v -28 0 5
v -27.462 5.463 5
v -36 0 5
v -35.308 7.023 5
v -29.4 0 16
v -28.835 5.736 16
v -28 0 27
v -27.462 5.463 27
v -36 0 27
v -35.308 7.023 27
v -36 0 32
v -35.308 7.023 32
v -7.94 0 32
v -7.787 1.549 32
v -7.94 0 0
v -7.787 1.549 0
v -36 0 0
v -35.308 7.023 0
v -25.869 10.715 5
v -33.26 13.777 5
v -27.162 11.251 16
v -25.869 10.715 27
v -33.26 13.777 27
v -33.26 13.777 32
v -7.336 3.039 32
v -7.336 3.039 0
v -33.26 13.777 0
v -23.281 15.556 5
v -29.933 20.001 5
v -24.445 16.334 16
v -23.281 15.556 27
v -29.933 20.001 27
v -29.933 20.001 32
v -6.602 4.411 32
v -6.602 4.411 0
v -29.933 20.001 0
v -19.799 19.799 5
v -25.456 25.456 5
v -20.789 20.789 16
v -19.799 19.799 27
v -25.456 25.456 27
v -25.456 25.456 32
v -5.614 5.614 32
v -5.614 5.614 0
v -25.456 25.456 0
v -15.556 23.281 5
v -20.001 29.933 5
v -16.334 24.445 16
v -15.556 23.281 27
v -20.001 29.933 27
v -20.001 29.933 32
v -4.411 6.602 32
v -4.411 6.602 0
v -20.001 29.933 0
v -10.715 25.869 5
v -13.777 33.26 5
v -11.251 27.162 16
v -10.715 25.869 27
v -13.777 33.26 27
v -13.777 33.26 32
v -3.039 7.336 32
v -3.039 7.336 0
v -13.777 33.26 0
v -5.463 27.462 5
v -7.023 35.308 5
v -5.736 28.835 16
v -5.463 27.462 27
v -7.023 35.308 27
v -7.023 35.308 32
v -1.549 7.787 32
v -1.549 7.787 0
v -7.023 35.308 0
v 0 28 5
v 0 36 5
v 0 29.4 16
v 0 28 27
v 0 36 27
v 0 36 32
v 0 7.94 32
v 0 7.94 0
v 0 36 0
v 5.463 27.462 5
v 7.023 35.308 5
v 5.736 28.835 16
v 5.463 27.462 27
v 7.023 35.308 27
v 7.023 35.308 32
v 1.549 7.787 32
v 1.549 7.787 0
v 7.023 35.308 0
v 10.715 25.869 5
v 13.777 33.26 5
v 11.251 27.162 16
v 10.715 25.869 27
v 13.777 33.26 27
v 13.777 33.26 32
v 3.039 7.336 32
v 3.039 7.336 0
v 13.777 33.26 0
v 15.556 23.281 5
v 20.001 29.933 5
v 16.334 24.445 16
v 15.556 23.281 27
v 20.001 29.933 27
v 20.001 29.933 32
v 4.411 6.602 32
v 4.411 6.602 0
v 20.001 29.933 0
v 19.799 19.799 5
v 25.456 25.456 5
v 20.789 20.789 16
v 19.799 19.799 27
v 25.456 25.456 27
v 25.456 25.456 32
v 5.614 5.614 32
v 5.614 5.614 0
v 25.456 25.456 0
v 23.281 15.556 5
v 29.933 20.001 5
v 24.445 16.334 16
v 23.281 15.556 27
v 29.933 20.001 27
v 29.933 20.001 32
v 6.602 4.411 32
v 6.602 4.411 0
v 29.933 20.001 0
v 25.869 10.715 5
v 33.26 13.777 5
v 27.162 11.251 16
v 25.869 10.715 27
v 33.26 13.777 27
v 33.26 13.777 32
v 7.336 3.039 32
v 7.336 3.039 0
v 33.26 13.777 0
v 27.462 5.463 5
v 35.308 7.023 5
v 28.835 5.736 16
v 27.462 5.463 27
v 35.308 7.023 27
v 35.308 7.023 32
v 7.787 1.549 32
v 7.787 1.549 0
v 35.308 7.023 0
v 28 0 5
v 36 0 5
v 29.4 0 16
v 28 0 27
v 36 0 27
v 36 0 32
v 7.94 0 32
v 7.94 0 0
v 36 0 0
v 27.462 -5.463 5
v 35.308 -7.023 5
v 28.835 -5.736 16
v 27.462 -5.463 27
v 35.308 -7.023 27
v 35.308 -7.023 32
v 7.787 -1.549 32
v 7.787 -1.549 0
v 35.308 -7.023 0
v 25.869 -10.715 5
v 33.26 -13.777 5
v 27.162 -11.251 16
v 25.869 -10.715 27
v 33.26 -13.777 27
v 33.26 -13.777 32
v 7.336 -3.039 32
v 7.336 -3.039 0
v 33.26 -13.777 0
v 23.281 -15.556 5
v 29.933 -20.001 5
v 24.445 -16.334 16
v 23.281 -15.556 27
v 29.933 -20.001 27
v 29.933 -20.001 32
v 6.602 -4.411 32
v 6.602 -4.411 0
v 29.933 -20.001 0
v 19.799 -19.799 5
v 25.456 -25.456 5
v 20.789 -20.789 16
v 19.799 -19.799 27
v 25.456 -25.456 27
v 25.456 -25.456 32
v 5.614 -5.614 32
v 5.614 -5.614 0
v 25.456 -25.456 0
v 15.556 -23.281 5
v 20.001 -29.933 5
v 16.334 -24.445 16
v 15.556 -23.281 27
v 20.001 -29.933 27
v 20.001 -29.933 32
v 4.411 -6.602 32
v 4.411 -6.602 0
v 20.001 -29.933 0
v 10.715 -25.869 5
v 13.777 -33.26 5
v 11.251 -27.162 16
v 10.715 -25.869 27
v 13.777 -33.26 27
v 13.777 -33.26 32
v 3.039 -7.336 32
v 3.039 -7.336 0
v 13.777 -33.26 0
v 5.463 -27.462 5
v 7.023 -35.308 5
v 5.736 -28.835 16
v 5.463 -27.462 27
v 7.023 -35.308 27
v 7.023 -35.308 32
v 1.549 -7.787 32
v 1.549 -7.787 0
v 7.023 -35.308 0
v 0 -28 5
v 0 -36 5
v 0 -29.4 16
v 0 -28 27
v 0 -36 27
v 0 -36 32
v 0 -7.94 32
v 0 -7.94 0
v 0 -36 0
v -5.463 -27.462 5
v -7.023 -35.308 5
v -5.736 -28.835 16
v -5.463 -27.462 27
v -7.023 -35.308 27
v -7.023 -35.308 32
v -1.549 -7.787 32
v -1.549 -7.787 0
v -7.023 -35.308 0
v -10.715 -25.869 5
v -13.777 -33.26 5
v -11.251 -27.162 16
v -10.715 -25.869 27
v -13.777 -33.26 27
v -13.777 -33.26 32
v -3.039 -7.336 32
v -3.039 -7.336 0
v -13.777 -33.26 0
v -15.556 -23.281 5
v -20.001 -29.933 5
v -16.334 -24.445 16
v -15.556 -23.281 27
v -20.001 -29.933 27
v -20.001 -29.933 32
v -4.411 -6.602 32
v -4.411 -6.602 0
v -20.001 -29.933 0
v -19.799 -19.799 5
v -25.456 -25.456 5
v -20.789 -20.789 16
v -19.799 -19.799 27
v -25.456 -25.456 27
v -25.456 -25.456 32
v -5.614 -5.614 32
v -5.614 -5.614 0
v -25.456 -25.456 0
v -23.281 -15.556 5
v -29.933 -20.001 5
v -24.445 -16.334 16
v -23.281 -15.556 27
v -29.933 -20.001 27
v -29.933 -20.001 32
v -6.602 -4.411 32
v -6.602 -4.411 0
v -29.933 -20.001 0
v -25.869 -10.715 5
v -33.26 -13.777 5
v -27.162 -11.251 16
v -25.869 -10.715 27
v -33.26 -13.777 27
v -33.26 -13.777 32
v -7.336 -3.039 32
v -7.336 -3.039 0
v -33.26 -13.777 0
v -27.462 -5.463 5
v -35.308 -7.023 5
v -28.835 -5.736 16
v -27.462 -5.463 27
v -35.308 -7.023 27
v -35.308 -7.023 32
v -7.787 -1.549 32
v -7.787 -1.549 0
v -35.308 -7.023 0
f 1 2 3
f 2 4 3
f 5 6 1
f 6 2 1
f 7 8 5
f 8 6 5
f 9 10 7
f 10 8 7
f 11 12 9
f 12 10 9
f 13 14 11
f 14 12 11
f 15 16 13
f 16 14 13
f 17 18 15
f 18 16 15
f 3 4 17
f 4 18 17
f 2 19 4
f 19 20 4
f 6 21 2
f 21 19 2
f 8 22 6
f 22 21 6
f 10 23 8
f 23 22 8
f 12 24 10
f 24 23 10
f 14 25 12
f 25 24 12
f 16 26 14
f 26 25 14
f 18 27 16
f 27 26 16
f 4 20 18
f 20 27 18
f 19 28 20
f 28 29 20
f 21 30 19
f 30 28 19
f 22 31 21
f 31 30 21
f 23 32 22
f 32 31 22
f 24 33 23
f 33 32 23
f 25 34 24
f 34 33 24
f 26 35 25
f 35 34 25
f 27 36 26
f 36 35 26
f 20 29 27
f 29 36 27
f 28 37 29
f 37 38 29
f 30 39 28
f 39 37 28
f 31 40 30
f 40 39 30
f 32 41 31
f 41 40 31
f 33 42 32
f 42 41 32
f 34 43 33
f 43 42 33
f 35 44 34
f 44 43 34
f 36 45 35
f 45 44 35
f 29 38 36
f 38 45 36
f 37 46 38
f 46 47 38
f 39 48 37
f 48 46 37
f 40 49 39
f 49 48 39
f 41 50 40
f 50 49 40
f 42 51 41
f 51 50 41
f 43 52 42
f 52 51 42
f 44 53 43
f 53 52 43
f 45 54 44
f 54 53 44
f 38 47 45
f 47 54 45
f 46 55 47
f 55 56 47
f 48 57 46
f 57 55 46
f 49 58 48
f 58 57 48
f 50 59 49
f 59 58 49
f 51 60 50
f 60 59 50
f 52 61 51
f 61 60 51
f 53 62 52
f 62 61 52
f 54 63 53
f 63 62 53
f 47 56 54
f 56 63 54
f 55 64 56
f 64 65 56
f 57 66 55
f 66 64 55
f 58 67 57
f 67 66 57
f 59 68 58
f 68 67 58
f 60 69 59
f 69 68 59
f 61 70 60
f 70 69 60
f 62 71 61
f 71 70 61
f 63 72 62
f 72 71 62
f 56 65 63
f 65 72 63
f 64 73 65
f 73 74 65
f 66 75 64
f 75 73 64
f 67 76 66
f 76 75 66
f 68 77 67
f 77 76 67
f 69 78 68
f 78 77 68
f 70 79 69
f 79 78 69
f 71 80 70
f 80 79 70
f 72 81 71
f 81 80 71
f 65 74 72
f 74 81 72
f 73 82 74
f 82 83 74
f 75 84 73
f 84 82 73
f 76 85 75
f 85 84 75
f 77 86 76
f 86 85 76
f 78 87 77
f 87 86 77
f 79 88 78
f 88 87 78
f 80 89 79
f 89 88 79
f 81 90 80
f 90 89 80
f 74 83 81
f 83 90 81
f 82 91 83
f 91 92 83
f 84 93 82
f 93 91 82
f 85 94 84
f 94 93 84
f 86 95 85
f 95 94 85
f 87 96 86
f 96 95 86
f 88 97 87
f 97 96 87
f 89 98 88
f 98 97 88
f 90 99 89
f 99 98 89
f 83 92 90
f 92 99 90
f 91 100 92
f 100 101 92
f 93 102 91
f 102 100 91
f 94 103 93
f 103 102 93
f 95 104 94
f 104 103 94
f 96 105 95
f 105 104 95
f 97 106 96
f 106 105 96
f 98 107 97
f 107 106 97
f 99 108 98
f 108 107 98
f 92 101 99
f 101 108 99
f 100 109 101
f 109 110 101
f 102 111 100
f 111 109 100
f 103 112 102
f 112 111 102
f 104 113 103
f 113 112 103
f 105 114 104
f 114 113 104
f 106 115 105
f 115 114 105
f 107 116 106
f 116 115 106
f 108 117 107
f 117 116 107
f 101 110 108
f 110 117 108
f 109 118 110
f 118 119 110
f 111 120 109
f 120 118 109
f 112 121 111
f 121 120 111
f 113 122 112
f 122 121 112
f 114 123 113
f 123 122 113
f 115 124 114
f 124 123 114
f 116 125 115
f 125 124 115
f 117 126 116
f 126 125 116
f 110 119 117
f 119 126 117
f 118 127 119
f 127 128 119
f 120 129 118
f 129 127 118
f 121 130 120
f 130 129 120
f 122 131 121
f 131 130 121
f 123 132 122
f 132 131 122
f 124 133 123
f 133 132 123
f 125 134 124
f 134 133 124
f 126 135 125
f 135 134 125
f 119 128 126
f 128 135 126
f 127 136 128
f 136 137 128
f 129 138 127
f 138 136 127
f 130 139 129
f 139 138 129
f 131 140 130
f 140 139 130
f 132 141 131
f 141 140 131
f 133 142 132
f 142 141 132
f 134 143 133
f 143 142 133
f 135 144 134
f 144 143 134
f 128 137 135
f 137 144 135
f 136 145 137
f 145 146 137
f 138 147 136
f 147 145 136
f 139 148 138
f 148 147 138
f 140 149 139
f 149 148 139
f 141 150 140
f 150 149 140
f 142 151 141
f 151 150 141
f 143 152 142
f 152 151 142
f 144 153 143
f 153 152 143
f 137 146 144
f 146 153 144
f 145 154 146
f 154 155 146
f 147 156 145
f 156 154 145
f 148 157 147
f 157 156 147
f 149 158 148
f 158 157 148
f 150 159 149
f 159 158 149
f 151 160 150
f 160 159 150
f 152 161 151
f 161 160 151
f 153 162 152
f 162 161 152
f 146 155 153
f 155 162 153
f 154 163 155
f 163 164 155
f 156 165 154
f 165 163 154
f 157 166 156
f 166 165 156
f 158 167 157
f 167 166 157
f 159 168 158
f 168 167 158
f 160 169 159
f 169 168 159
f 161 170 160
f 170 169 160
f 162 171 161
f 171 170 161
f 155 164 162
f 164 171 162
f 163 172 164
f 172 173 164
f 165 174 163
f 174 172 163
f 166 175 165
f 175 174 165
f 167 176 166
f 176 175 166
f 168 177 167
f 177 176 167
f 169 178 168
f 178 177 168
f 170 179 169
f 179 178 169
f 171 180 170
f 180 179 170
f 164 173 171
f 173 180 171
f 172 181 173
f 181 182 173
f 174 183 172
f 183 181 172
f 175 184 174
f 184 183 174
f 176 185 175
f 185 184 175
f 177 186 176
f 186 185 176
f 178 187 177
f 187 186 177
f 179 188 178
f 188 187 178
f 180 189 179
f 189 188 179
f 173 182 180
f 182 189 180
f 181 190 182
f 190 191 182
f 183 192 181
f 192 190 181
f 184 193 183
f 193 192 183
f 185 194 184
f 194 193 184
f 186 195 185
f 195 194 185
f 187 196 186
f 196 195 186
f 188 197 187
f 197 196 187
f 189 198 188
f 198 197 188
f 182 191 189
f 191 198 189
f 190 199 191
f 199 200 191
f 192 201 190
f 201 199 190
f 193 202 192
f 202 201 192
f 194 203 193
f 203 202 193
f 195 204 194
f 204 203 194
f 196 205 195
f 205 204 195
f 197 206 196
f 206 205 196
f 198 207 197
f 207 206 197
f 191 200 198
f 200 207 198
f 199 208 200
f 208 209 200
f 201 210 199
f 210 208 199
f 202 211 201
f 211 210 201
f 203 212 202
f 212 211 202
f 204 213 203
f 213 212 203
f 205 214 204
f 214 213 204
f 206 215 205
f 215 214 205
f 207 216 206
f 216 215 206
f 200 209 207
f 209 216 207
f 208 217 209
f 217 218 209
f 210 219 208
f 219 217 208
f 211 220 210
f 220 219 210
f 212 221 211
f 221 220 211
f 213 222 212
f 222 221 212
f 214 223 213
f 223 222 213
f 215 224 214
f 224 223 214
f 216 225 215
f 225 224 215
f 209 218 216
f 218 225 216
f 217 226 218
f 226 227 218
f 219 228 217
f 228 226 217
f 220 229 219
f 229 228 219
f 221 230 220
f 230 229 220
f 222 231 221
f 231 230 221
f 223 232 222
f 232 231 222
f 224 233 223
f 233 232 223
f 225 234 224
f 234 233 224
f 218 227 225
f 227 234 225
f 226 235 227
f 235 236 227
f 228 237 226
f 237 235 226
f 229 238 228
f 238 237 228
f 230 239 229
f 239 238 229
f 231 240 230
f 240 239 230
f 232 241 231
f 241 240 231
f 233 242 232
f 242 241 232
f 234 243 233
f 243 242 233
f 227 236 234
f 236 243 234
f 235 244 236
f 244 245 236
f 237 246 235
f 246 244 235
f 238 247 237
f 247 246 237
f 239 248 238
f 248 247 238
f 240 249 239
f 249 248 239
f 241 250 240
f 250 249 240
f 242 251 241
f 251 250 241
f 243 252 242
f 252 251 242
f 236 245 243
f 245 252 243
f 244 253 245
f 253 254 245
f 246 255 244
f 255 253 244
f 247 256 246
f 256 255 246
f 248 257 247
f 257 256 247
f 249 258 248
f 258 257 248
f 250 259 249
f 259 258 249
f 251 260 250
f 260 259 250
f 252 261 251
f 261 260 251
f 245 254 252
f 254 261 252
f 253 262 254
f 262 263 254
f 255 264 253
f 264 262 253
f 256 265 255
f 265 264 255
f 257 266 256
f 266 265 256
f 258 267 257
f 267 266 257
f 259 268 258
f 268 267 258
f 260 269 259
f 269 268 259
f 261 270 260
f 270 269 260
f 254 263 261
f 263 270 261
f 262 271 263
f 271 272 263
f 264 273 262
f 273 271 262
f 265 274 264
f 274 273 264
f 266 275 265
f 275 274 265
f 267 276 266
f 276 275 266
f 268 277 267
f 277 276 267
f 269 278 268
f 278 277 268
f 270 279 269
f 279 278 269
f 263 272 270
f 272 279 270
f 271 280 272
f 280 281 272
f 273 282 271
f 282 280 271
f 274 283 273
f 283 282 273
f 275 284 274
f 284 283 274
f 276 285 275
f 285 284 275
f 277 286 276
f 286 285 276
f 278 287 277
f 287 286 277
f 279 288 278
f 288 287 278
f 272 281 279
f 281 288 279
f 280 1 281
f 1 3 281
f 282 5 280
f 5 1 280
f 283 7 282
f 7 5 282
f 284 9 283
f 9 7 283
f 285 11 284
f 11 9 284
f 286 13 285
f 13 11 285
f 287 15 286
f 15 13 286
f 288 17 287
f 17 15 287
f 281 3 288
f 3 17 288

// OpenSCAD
$fn = 32;

// ----------------------------------------------------------------------
// Belt roller: 56 mm barrel, 32 mm wide, bore 15.88 mm
// ----------------------------------------------------------------------

// --- parameters (mm) ---
bore_d = 15.88;           // bore
barrel_d = 56;            // barrel diameter
roller_w = 32;            // roller width
flange_d = 72;            // flange diameter
flange_t = 5;             // flange thickness
hub_d = 39.88;            // hub diameter

roller_profile = [[7.94, 0], [36, 0], [36, 5], [28, 5], [29.4, 16], [28, 27], [36, 27], [36, 32], [7.94, 32]];

/* the profile stays clear of the axis, so the bore comes out of the revolve */
rotate_extrude() polygon(roller_profile);
